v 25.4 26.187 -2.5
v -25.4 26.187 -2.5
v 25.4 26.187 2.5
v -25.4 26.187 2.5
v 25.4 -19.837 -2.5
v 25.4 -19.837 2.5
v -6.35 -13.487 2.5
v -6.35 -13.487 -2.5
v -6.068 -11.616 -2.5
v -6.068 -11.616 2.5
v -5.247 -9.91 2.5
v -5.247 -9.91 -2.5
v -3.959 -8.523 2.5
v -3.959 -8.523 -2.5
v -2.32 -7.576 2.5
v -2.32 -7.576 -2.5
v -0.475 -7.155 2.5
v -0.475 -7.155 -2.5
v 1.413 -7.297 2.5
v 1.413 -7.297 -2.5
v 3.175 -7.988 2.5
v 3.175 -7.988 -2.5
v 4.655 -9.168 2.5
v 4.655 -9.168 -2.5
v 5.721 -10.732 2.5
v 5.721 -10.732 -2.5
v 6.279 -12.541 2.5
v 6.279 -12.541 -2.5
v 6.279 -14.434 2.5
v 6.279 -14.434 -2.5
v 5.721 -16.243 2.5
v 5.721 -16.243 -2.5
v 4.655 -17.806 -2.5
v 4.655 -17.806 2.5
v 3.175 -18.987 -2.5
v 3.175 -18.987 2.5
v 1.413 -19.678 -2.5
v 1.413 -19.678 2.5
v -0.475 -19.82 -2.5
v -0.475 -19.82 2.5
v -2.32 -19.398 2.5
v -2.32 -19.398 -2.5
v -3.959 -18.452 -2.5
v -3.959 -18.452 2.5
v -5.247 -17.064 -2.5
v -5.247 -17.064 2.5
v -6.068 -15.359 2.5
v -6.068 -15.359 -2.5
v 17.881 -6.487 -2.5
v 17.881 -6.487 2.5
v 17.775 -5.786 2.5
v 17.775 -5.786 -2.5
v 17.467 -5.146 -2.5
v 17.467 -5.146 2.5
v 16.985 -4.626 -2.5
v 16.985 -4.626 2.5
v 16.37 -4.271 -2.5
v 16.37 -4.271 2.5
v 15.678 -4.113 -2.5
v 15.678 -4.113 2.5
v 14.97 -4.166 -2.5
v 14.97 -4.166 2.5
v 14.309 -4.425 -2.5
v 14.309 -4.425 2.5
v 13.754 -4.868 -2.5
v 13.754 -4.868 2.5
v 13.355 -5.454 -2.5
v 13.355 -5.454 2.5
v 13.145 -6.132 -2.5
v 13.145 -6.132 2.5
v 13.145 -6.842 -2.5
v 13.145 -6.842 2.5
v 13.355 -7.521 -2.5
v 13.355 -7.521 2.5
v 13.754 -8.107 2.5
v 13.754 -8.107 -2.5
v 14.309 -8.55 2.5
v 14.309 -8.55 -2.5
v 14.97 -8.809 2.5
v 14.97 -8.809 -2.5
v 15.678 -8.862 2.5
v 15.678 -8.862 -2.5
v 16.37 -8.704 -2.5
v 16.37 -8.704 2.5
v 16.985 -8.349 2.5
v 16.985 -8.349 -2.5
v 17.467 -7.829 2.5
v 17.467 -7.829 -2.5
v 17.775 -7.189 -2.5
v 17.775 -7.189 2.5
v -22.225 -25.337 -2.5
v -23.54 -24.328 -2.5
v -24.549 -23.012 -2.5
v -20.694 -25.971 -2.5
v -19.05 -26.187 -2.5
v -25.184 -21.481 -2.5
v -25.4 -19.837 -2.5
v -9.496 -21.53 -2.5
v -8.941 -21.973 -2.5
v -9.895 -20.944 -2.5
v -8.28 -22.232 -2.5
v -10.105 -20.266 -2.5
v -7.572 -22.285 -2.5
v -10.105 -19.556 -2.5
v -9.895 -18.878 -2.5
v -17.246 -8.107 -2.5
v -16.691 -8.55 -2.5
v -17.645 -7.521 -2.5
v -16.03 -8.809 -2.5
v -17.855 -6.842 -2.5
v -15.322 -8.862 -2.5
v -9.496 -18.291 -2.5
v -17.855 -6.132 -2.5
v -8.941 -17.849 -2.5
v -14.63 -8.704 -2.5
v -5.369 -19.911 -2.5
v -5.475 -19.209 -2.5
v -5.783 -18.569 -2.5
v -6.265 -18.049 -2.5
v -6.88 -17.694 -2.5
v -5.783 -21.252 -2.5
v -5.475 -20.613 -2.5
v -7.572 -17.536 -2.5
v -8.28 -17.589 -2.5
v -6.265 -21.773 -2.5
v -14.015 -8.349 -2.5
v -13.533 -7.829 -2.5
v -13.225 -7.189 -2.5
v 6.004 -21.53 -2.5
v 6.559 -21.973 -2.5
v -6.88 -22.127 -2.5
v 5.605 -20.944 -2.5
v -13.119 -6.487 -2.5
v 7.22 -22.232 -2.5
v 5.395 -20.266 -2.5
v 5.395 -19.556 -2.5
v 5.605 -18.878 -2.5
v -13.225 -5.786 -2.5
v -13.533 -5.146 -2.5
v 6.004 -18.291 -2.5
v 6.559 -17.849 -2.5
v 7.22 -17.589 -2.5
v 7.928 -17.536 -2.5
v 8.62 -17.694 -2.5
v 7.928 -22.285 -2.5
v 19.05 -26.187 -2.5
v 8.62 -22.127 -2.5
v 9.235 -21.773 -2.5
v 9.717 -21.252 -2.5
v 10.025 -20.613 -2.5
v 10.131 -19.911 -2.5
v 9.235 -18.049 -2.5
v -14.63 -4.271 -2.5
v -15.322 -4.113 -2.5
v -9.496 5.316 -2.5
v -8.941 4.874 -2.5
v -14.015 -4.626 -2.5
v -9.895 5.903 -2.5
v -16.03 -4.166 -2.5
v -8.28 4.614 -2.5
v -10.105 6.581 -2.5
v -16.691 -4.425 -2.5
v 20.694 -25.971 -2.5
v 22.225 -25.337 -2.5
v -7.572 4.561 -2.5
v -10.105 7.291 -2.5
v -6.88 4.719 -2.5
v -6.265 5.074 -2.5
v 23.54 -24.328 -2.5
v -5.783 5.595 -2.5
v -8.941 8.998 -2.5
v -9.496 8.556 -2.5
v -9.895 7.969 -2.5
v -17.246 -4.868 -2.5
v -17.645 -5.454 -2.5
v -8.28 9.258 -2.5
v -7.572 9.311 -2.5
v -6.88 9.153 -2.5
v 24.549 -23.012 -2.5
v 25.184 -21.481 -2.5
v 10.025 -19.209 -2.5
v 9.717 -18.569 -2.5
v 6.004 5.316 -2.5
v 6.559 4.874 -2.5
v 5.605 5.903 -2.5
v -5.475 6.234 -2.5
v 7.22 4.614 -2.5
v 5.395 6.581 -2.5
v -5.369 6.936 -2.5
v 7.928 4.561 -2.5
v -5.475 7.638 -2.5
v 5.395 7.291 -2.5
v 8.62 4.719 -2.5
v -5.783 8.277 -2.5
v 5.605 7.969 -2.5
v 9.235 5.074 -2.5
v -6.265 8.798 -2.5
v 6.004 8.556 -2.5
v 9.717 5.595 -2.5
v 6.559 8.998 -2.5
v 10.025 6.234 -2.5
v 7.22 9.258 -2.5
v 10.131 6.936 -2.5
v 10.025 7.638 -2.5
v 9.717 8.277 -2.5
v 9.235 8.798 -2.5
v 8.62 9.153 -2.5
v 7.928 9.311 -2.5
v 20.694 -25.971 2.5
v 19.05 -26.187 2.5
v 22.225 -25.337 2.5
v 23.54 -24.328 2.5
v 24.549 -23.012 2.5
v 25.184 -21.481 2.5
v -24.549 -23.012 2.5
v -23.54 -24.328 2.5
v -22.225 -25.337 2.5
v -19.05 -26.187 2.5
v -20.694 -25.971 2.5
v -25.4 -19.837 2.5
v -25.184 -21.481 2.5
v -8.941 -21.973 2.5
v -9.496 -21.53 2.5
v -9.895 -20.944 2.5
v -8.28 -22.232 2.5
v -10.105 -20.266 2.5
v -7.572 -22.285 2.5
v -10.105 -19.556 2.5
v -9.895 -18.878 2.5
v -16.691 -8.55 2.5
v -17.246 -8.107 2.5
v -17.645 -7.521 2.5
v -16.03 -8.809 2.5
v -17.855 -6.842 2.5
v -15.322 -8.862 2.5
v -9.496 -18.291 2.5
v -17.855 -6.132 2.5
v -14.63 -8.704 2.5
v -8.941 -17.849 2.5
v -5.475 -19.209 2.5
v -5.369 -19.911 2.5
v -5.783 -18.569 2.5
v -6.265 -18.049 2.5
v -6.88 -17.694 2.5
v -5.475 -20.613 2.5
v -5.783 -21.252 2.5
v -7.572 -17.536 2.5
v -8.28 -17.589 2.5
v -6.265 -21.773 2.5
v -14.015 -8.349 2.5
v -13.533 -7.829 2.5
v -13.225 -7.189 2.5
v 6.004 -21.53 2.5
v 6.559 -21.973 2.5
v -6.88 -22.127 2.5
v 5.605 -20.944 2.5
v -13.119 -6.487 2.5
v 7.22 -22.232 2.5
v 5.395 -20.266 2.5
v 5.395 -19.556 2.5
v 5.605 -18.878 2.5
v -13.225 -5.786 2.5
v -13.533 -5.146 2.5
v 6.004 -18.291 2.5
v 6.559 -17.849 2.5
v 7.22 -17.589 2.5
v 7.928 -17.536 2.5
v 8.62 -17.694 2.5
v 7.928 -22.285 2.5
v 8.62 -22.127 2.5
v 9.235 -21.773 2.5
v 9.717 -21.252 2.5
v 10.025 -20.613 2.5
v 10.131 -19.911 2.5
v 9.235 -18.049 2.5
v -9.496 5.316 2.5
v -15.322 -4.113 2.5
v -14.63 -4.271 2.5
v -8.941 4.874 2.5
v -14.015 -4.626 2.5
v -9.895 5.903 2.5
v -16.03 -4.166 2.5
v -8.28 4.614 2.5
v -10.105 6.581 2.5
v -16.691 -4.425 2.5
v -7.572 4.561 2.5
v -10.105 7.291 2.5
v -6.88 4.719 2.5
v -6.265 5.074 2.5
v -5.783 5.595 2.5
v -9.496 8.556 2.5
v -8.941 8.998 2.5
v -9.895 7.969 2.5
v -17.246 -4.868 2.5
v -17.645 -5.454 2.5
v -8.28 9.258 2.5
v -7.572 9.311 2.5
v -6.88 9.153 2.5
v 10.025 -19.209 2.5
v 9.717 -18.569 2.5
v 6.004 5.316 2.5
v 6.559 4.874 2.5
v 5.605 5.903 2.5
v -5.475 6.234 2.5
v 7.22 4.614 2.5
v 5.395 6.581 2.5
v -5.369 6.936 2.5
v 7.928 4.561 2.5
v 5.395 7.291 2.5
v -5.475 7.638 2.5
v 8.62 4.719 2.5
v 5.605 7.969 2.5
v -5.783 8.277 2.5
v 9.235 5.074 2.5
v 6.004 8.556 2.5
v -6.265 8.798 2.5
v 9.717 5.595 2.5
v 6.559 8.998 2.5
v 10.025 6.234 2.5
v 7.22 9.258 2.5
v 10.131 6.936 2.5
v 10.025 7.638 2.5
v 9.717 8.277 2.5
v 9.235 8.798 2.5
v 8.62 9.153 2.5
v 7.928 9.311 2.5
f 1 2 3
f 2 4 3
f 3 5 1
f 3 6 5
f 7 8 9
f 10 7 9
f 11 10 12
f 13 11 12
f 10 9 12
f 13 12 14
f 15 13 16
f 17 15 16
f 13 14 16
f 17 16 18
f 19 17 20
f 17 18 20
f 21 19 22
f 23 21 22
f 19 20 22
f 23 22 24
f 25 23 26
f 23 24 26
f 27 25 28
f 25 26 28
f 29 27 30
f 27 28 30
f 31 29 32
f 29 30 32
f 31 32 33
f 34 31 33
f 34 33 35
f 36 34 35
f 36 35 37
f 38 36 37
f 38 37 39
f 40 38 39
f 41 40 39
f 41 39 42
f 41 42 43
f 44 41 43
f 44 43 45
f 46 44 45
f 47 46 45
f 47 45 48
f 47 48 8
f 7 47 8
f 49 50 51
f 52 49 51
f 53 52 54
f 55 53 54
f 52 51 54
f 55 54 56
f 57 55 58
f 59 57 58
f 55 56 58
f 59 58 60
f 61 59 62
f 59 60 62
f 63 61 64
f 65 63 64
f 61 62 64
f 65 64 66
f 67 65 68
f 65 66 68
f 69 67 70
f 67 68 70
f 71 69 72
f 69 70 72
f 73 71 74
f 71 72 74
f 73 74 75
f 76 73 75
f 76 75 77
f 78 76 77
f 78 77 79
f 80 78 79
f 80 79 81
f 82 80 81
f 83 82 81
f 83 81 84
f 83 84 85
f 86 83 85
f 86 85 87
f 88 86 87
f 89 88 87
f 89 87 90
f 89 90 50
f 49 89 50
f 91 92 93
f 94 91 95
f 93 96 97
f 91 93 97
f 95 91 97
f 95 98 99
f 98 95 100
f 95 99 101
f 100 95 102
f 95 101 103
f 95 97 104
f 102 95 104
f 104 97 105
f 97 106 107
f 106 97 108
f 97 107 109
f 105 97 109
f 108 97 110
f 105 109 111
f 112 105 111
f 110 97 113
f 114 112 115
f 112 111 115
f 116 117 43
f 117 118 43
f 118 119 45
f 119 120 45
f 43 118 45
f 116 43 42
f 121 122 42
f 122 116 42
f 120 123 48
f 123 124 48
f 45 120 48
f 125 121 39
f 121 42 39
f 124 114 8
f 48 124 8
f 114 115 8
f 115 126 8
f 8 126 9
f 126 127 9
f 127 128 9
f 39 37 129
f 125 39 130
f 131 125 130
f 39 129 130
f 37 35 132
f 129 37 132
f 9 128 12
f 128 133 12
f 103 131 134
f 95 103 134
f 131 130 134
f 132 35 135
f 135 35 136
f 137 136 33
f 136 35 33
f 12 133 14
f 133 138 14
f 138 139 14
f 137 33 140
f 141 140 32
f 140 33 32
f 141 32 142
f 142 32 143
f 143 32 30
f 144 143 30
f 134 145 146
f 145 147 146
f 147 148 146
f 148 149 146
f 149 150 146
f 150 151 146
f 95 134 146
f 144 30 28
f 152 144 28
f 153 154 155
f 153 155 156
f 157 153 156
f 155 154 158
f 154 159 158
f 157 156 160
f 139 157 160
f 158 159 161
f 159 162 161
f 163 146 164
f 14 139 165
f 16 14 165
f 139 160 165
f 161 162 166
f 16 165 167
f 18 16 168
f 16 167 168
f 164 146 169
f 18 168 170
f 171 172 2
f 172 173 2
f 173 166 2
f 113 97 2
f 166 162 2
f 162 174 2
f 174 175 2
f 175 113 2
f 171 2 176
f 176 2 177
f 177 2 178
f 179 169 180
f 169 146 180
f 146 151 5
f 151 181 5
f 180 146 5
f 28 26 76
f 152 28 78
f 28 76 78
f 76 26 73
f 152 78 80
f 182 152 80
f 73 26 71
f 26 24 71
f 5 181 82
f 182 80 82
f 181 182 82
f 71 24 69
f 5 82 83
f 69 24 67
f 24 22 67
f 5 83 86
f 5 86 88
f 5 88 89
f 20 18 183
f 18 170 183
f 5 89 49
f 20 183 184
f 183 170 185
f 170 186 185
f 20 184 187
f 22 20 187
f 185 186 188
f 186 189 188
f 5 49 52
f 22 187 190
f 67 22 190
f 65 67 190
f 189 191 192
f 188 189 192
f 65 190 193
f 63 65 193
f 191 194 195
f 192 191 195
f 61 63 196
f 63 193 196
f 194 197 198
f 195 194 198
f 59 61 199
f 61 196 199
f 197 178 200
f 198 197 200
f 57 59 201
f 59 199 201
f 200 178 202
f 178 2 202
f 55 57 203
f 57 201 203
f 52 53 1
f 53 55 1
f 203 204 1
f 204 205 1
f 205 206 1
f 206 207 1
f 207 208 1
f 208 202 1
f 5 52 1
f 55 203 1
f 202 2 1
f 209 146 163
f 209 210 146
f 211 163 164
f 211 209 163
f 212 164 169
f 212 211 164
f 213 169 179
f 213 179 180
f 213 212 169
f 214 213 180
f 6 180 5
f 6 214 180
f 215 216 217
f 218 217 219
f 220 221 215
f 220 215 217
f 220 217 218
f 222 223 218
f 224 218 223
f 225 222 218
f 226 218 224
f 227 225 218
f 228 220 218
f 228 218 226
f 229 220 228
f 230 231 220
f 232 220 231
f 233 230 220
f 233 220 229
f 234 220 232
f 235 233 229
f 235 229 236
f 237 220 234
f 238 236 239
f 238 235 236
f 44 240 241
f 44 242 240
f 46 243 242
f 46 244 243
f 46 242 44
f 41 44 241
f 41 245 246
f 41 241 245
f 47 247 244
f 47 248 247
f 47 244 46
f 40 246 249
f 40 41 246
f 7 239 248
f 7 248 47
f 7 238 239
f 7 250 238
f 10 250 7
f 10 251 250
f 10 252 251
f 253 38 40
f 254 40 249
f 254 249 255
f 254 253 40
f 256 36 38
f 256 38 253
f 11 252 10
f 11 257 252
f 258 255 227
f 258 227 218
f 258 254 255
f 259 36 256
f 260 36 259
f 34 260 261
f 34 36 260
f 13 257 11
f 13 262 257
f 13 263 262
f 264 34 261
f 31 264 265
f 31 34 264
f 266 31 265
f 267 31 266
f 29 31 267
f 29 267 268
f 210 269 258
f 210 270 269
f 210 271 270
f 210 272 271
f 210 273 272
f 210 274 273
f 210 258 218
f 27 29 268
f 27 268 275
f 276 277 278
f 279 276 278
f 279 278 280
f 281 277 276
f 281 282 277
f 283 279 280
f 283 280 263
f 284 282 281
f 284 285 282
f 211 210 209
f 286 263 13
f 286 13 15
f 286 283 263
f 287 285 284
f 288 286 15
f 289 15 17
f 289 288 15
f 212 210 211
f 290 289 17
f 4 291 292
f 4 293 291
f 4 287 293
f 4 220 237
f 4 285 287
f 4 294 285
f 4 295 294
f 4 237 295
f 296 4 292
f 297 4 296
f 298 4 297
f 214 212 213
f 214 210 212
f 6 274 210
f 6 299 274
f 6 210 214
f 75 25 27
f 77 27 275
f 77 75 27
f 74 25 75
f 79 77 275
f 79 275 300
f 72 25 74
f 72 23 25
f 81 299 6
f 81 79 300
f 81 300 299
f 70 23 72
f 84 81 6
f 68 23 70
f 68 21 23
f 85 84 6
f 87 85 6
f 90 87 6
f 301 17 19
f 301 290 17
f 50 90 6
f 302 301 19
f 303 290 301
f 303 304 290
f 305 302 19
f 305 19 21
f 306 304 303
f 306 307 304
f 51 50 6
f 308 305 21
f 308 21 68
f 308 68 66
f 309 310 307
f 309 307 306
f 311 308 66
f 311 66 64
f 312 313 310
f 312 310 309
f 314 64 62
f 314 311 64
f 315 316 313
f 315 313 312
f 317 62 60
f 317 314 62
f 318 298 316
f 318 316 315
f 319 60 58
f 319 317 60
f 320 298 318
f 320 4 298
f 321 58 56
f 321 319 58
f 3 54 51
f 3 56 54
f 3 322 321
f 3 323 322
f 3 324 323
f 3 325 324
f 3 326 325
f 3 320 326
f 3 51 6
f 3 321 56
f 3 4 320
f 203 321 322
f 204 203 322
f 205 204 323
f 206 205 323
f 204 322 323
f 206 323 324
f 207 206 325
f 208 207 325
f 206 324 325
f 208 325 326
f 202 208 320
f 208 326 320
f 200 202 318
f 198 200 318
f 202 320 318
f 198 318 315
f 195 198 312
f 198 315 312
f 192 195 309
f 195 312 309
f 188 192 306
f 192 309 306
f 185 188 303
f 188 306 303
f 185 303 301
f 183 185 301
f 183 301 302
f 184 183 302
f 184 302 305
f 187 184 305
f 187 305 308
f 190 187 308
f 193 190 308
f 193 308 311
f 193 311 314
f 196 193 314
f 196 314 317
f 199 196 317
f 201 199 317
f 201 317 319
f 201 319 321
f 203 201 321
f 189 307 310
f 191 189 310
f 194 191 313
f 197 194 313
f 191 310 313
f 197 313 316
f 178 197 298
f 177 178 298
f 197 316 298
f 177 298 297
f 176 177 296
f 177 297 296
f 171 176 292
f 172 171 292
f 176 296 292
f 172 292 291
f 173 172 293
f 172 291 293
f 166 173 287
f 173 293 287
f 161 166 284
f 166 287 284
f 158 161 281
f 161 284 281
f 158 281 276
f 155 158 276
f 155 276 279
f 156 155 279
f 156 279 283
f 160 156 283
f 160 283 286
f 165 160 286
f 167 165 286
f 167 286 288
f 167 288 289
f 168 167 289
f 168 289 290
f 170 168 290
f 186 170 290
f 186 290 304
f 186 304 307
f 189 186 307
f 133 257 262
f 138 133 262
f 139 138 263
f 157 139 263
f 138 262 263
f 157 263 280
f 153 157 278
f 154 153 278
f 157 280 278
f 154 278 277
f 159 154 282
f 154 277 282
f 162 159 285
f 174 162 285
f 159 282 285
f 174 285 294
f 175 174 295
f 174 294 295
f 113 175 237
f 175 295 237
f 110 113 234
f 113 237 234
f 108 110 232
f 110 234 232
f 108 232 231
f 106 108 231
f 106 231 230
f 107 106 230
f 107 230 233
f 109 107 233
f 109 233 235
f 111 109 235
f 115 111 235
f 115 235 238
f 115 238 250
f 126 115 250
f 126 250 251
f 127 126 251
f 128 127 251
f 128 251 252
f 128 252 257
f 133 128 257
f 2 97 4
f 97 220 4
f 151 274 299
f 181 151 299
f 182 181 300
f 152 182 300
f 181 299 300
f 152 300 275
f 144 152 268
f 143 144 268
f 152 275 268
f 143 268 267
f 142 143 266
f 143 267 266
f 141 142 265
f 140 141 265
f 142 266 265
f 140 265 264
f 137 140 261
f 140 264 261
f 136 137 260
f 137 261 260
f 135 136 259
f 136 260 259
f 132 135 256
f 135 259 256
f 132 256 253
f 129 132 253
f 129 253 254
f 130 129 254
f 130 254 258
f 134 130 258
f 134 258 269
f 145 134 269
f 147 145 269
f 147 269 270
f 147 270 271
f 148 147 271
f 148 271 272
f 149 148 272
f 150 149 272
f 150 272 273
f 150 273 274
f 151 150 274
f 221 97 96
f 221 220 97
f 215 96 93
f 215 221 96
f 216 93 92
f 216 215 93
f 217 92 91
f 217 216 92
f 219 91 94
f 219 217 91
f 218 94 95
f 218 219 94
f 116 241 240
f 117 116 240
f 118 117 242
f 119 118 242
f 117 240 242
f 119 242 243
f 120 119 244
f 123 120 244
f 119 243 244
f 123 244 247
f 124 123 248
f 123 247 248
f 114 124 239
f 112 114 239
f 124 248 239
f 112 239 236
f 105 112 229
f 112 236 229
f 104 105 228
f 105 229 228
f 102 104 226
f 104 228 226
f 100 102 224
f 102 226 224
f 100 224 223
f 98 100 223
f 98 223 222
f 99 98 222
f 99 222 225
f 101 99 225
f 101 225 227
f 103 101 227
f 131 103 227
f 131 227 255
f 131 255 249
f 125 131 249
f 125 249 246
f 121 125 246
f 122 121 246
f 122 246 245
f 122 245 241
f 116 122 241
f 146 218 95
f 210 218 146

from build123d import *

# Parameters (mm, degrees)
SKETCH1_W                      = 50.8
SKETCH1_H                      = 52.3748
BOSS_EXTRUDE1_DEPTH            = 2.5
F_1_2_0_5_DIAMETER_HOLE1_D     = 12.7
F_3_16_0_1875_DIAMETER_HOLE1_D = 4.7625
FILLET1_R                      = 6.35


with BuildPart() as part:
    # Sketch1 → Boss-Extrude1 (new, symmetric)
    with BuildSketch(Plane.XY):
        Rectangle(SKETCH1_W, SKETCH1_H)
    extrude(amount=BOSS_EXTRUDE1_DEPTH, both=True)

    # 1/2 (0.5) Diameter Hole1 (through all)
    with Locations(Plane.XY.offset(2.5)):
        with Locations((0, -13.4874)):
            Hole(F_1_2_0_5_DIAMETER_HOLE1_D / 2)

    # 3/16 (0.1875) Diameter Hole1 (through all)
    with Locations(Plane(origin=(0, 0, -2.5), x_dir=(-1, 0, 0), z_dir=(0, 0, -1))):
        with Locations((15.5, -6.4874), (7.75, 6.935993759), (-7.75, 6.935993759), (-15.5, -6.4874), (7.75, -19.910793759), (-7.75, -19.910793759)):
            Hole(F_3_16_0_1875_DIAMETER_HOLE1_D / 2)

    # Fillet1
    fillet1_edges = [part.edges().sort_by_distance(p)[0] for p in [
        (25.4, -26.1874, 0),
        (-25.4, -26.1874, 0),
    ]]
    fillet(fillet1_edges, radius=FILLET1_R)


solid = part.part
